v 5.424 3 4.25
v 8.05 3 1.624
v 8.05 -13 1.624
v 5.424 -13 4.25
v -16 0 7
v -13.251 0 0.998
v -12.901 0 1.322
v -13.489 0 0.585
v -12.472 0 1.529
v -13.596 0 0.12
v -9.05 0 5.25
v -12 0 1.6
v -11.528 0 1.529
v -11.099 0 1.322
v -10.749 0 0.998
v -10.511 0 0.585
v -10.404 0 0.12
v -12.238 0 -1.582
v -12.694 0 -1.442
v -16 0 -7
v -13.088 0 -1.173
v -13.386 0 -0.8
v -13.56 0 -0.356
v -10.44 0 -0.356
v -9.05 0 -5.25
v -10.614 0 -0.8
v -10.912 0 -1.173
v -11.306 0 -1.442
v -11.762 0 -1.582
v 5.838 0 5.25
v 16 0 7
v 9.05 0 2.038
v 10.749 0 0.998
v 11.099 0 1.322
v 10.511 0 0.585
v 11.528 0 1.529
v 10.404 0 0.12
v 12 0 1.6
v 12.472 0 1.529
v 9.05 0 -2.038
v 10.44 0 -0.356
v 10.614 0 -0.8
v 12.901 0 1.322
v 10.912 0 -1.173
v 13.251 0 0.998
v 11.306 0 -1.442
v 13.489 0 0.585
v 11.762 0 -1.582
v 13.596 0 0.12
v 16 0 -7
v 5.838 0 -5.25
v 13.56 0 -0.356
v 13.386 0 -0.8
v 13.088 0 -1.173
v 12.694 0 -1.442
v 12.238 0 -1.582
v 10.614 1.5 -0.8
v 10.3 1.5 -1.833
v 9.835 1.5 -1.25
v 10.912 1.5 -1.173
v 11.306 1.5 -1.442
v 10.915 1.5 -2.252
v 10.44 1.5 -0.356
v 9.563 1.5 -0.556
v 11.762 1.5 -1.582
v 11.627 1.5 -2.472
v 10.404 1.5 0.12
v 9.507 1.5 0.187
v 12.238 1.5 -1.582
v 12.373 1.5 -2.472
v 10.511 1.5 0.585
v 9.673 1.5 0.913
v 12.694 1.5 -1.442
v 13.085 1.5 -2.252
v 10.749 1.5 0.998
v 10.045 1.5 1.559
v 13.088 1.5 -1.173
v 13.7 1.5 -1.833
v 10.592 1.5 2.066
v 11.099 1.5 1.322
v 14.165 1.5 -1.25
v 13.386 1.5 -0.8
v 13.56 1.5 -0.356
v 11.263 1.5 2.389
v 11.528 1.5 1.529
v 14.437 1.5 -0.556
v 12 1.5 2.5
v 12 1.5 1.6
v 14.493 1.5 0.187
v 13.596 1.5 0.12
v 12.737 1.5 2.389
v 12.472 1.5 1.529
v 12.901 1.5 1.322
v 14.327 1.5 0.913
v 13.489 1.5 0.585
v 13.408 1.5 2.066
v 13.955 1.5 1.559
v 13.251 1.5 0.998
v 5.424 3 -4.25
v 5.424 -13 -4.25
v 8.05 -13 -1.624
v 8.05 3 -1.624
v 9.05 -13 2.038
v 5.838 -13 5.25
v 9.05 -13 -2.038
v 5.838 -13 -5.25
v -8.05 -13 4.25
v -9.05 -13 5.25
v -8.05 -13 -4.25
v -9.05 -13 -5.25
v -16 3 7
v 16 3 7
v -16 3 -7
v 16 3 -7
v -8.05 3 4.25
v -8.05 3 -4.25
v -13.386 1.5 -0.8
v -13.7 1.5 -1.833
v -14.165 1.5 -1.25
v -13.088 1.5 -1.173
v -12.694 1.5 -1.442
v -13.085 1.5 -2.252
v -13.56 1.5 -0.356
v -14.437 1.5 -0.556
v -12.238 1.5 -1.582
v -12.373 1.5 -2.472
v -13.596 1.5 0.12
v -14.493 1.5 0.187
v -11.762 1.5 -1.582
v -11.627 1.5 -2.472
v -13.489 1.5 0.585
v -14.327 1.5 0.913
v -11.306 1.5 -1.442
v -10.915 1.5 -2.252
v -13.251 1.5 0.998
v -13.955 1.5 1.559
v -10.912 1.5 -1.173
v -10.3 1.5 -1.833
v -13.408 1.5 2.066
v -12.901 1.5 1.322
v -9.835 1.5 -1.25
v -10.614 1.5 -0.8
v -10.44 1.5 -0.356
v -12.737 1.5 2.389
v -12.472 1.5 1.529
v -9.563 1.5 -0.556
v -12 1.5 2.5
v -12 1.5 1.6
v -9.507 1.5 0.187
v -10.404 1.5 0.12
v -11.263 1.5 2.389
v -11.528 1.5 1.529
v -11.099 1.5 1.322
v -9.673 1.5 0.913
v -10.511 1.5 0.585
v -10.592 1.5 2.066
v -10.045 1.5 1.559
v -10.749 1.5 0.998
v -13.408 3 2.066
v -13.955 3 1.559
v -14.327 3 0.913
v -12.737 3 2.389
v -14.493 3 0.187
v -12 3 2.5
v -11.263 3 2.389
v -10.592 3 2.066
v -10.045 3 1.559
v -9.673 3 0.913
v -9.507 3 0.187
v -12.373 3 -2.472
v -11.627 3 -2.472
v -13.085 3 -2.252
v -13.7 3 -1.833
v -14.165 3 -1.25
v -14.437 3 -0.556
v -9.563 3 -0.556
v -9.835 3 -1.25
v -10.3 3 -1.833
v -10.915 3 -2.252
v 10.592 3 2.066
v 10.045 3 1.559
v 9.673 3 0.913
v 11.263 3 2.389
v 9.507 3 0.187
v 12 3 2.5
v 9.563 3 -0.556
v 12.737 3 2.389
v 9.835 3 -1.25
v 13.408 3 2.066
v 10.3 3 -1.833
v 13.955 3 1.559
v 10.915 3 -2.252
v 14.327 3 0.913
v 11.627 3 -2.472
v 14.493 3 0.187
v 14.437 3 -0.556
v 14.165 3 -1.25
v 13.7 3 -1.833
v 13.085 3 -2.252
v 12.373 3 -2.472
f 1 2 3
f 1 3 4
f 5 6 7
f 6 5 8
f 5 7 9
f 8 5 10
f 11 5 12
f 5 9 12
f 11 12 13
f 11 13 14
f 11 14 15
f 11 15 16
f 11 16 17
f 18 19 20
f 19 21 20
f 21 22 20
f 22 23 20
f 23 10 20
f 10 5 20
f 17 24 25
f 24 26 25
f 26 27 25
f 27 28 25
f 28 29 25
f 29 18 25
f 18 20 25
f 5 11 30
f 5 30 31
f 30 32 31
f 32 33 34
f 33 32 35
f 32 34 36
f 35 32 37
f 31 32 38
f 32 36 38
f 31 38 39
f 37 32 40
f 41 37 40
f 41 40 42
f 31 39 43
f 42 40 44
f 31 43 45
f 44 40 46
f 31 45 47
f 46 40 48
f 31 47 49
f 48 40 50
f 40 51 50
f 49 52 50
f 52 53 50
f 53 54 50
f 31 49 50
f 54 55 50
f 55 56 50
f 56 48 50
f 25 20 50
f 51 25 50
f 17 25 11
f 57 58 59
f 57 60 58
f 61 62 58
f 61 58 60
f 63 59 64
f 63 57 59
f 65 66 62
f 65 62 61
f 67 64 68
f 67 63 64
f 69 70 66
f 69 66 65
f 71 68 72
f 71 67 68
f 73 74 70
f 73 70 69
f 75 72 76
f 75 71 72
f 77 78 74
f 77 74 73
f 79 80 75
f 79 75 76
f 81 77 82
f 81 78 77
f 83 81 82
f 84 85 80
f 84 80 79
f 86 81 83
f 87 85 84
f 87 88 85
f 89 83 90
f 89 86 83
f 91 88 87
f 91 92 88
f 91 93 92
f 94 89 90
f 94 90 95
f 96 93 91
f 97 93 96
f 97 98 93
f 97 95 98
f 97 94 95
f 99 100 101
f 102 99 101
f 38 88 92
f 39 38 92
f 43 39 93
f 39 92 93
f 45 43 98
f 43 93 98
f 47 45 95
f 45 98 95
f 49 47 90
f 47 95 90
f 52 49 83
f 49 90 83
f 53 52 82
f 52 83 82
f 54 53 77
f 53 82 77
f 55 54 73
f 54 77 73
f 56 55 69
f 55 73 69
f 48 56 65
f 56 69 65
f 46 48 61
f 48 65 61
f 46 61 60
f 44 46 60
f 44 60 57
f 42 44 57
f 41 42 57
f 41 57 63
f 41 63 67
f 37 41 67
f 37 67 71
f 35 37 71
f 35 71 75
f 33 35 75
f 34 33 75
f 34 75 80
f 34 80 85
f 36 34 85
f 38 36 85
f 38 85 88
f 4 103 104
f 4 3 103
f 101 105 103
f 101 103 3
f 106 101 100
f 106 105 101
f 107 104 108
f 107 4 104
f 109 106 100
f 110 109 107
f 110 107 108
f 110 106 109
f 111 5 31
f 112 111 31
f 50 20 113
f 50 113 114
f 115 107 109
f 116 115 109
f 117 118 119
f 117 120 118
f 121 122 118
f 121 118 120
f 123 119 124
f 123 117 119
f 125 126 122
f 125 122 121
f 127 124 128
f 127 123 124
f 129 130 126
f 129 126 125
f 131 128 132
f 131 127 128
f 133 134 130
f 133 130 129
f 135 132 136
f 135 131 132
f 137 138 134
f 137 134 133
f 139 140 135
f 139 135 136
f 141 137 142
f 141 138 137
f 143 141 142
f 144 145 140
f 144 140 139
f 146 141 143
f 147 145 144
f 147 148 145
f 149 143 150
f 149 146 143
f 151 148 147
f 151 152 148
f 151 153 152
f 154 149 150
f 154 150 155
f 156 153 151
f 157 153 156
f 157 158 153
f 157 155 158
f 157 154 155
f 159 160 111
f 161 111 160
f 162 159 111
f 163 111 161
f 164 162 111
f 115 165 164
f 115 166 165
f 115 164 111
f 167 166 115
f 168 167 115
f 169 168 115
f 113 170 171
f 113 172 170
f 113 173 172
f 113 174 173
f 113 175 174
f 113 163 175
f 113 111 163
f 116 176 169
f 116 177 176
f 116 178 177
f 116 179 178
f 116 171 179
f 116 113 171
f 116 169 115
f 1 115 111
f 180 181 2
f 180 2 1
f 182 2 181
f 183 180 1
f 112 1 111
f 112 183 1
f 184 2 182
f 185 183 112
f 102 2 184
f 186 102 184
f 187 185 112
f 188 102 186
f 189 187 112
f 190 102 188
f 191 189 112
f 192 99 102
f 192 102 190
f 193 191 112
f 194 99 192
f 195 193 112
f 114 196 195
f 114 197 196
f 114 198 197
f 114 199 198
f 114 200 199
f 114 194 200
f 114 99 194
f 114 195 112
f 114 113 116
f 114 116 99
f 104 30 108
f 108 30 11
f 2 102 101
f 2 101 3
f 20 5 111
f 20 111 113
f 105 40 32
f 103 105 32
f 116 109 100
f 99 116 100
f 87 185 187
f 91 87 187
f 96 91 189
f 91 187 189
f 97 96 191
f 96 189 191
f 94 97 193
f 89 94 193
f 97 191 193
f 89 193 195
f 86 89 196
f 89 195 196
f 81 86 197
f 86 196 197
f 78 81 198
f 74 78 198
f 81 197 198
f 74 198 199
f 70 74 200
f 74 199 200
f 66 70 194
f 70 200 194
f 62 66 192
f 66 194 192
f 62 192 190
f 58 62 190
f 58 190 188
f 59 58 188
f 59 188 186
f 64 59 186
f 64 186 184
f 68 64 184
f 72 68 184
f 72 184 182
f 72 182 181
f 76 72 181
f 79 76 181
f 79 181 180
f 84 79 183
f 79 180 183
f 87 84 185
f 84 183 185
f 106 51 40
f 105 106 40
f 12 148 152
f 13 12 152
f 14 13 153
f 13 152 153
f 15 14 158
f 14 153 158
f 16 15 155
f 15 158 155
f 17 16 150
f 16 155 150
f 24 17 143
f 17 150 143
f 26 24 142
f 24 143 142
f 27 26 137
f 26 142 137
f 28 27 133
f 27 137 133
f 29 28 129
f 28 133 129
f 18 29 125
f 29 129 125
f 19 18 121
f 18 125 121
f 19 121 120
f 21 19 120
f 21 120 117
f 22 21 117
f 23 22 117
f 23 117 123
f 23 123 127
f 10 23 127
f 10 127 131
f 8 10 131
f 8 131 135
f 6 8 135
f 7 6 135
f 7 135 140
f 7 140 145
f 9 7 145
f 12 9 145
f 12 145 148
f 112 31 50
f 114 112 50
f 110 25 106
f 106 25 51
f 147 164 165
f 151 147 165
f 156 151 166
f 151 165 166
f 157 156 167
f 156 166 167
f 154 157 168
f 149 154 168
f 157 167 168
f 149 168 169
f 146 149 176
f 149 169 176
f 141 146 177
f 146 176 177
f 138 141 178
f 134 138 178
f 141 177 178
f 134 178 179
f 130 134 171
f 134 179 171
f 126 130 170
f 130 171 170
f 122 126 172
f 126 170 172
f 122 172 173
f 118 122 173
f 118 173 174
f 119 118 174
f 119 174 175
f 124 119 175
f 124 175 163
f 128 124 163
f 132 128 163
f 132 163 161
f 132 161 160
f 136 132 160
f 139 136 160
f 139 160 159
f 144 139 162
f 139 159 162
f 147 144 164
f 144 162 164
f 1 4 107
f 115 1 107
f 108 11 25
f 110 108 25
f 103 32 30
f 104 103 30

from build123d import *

# Parameters (mm, degrees)
SKETCH1_W           = 32
SKETCH1_H           = 14
BOSS_EXTRUDE1_DEPTH = 3
CUT_EXTRUDE1_DEPTH  = 3
BOSS_EXTRUDE2_DEPTH = 16
SKETCH4_R           = 1.6
CUT_EXTRUDE2_DEPTH  = 3
SKETCH5_R           = 2.5
CUT_EXTRUDE3_DEPTH  = 1.5


with BuildPart() as part:
    # Sketch1 → Boss-Extrude1 (new body)
    with BuildSketch(Plane(origin=(0, 0, 0), x_dir=(1, 0, 0), z_dir=(0, 1, 0))):
        Rectangle(SKETCH1_W, SKETCH1_H)
    extrude(amount=BOSS_EXTRUDE1_DEPTH)

    # Sketch2 → Cut-Extrude1 (cut)
    with BuildSketch(Plane(origin=(0, 3, 0), x_dir=(1, 0, 0), z_dir=(0, 1, 0))):
        Polygon((5.424264069, -4.25), (-8.05, -4.25), (-8.05, 4.25), (5.424264069, 4.25), (8.05, 1.624264069), (8.05, -1.624264069), align=None)
    extrude(amount=-CUT_EXTRUDE1_DEPTH, mode=Mode.SUBTRACT)

    # Sketch3 → Boss-Extrude2 (add)
    with BuildSketch(Plane(origin=(0, 3, 0), x_dir=(1, 0, 0), z_dir=(0, 1, 0))):
        Polygon((5.838477631, -5.25), (-9.05, -5.25), (-9.05, 5.25), (5.838477631, 5.25), (9.05, 2.038477631), (9.05, -2.038477631), align=None)
        Polygon((-8.05, -4.25), (-8.05, 4.25), (5.424264069, 4.25), (8.05, 1.624264069), (8.05, -1.624264069), (5.424264069, -4.25), align=None, mode=Mode.SUBTRACT)
    extrude(amount=-BOSS_EXTRUDE2_DEPTH)

    # Sketch4 → Cut-Extrude2 (cut)
    with BuildSketch(Plane(origin=(0, 3, 0), x_dir=(1, 0, 0), z_dir=(0, 1, 0))):
        with Locations(Location((-12, 0, 0), (0, 0, 270))):
            Circle(SKETCH4_R)
        with Locations(Location((12, 0, 0), (0, 0, 270))):
            Circle(SKETCH4_R)
    extrude(amount=-CUT_EXTRUDE2_DEPTH, mode=Mode.SUBTRACT)

    # Sketch5 → Cut-Extrude3 (cut)
    with BuildSketch(Plane(origin=(0, 3, 0), x_dir=(1, 0, 0), z_dir=(0, 1, 0))):
        with Locations(Location((-12, 0, 0), (0, 0, 270))):
            Circle(SKETCH5_R)
        with Locations(Location((12, 0, 0), (0, 0, 270))):
            Circle(SKETCH5_R)
    extrude(amount=-CUT_EXTRUDE3_DEPTH, mode=Mode.SUBTRACT)


solid = part.part
